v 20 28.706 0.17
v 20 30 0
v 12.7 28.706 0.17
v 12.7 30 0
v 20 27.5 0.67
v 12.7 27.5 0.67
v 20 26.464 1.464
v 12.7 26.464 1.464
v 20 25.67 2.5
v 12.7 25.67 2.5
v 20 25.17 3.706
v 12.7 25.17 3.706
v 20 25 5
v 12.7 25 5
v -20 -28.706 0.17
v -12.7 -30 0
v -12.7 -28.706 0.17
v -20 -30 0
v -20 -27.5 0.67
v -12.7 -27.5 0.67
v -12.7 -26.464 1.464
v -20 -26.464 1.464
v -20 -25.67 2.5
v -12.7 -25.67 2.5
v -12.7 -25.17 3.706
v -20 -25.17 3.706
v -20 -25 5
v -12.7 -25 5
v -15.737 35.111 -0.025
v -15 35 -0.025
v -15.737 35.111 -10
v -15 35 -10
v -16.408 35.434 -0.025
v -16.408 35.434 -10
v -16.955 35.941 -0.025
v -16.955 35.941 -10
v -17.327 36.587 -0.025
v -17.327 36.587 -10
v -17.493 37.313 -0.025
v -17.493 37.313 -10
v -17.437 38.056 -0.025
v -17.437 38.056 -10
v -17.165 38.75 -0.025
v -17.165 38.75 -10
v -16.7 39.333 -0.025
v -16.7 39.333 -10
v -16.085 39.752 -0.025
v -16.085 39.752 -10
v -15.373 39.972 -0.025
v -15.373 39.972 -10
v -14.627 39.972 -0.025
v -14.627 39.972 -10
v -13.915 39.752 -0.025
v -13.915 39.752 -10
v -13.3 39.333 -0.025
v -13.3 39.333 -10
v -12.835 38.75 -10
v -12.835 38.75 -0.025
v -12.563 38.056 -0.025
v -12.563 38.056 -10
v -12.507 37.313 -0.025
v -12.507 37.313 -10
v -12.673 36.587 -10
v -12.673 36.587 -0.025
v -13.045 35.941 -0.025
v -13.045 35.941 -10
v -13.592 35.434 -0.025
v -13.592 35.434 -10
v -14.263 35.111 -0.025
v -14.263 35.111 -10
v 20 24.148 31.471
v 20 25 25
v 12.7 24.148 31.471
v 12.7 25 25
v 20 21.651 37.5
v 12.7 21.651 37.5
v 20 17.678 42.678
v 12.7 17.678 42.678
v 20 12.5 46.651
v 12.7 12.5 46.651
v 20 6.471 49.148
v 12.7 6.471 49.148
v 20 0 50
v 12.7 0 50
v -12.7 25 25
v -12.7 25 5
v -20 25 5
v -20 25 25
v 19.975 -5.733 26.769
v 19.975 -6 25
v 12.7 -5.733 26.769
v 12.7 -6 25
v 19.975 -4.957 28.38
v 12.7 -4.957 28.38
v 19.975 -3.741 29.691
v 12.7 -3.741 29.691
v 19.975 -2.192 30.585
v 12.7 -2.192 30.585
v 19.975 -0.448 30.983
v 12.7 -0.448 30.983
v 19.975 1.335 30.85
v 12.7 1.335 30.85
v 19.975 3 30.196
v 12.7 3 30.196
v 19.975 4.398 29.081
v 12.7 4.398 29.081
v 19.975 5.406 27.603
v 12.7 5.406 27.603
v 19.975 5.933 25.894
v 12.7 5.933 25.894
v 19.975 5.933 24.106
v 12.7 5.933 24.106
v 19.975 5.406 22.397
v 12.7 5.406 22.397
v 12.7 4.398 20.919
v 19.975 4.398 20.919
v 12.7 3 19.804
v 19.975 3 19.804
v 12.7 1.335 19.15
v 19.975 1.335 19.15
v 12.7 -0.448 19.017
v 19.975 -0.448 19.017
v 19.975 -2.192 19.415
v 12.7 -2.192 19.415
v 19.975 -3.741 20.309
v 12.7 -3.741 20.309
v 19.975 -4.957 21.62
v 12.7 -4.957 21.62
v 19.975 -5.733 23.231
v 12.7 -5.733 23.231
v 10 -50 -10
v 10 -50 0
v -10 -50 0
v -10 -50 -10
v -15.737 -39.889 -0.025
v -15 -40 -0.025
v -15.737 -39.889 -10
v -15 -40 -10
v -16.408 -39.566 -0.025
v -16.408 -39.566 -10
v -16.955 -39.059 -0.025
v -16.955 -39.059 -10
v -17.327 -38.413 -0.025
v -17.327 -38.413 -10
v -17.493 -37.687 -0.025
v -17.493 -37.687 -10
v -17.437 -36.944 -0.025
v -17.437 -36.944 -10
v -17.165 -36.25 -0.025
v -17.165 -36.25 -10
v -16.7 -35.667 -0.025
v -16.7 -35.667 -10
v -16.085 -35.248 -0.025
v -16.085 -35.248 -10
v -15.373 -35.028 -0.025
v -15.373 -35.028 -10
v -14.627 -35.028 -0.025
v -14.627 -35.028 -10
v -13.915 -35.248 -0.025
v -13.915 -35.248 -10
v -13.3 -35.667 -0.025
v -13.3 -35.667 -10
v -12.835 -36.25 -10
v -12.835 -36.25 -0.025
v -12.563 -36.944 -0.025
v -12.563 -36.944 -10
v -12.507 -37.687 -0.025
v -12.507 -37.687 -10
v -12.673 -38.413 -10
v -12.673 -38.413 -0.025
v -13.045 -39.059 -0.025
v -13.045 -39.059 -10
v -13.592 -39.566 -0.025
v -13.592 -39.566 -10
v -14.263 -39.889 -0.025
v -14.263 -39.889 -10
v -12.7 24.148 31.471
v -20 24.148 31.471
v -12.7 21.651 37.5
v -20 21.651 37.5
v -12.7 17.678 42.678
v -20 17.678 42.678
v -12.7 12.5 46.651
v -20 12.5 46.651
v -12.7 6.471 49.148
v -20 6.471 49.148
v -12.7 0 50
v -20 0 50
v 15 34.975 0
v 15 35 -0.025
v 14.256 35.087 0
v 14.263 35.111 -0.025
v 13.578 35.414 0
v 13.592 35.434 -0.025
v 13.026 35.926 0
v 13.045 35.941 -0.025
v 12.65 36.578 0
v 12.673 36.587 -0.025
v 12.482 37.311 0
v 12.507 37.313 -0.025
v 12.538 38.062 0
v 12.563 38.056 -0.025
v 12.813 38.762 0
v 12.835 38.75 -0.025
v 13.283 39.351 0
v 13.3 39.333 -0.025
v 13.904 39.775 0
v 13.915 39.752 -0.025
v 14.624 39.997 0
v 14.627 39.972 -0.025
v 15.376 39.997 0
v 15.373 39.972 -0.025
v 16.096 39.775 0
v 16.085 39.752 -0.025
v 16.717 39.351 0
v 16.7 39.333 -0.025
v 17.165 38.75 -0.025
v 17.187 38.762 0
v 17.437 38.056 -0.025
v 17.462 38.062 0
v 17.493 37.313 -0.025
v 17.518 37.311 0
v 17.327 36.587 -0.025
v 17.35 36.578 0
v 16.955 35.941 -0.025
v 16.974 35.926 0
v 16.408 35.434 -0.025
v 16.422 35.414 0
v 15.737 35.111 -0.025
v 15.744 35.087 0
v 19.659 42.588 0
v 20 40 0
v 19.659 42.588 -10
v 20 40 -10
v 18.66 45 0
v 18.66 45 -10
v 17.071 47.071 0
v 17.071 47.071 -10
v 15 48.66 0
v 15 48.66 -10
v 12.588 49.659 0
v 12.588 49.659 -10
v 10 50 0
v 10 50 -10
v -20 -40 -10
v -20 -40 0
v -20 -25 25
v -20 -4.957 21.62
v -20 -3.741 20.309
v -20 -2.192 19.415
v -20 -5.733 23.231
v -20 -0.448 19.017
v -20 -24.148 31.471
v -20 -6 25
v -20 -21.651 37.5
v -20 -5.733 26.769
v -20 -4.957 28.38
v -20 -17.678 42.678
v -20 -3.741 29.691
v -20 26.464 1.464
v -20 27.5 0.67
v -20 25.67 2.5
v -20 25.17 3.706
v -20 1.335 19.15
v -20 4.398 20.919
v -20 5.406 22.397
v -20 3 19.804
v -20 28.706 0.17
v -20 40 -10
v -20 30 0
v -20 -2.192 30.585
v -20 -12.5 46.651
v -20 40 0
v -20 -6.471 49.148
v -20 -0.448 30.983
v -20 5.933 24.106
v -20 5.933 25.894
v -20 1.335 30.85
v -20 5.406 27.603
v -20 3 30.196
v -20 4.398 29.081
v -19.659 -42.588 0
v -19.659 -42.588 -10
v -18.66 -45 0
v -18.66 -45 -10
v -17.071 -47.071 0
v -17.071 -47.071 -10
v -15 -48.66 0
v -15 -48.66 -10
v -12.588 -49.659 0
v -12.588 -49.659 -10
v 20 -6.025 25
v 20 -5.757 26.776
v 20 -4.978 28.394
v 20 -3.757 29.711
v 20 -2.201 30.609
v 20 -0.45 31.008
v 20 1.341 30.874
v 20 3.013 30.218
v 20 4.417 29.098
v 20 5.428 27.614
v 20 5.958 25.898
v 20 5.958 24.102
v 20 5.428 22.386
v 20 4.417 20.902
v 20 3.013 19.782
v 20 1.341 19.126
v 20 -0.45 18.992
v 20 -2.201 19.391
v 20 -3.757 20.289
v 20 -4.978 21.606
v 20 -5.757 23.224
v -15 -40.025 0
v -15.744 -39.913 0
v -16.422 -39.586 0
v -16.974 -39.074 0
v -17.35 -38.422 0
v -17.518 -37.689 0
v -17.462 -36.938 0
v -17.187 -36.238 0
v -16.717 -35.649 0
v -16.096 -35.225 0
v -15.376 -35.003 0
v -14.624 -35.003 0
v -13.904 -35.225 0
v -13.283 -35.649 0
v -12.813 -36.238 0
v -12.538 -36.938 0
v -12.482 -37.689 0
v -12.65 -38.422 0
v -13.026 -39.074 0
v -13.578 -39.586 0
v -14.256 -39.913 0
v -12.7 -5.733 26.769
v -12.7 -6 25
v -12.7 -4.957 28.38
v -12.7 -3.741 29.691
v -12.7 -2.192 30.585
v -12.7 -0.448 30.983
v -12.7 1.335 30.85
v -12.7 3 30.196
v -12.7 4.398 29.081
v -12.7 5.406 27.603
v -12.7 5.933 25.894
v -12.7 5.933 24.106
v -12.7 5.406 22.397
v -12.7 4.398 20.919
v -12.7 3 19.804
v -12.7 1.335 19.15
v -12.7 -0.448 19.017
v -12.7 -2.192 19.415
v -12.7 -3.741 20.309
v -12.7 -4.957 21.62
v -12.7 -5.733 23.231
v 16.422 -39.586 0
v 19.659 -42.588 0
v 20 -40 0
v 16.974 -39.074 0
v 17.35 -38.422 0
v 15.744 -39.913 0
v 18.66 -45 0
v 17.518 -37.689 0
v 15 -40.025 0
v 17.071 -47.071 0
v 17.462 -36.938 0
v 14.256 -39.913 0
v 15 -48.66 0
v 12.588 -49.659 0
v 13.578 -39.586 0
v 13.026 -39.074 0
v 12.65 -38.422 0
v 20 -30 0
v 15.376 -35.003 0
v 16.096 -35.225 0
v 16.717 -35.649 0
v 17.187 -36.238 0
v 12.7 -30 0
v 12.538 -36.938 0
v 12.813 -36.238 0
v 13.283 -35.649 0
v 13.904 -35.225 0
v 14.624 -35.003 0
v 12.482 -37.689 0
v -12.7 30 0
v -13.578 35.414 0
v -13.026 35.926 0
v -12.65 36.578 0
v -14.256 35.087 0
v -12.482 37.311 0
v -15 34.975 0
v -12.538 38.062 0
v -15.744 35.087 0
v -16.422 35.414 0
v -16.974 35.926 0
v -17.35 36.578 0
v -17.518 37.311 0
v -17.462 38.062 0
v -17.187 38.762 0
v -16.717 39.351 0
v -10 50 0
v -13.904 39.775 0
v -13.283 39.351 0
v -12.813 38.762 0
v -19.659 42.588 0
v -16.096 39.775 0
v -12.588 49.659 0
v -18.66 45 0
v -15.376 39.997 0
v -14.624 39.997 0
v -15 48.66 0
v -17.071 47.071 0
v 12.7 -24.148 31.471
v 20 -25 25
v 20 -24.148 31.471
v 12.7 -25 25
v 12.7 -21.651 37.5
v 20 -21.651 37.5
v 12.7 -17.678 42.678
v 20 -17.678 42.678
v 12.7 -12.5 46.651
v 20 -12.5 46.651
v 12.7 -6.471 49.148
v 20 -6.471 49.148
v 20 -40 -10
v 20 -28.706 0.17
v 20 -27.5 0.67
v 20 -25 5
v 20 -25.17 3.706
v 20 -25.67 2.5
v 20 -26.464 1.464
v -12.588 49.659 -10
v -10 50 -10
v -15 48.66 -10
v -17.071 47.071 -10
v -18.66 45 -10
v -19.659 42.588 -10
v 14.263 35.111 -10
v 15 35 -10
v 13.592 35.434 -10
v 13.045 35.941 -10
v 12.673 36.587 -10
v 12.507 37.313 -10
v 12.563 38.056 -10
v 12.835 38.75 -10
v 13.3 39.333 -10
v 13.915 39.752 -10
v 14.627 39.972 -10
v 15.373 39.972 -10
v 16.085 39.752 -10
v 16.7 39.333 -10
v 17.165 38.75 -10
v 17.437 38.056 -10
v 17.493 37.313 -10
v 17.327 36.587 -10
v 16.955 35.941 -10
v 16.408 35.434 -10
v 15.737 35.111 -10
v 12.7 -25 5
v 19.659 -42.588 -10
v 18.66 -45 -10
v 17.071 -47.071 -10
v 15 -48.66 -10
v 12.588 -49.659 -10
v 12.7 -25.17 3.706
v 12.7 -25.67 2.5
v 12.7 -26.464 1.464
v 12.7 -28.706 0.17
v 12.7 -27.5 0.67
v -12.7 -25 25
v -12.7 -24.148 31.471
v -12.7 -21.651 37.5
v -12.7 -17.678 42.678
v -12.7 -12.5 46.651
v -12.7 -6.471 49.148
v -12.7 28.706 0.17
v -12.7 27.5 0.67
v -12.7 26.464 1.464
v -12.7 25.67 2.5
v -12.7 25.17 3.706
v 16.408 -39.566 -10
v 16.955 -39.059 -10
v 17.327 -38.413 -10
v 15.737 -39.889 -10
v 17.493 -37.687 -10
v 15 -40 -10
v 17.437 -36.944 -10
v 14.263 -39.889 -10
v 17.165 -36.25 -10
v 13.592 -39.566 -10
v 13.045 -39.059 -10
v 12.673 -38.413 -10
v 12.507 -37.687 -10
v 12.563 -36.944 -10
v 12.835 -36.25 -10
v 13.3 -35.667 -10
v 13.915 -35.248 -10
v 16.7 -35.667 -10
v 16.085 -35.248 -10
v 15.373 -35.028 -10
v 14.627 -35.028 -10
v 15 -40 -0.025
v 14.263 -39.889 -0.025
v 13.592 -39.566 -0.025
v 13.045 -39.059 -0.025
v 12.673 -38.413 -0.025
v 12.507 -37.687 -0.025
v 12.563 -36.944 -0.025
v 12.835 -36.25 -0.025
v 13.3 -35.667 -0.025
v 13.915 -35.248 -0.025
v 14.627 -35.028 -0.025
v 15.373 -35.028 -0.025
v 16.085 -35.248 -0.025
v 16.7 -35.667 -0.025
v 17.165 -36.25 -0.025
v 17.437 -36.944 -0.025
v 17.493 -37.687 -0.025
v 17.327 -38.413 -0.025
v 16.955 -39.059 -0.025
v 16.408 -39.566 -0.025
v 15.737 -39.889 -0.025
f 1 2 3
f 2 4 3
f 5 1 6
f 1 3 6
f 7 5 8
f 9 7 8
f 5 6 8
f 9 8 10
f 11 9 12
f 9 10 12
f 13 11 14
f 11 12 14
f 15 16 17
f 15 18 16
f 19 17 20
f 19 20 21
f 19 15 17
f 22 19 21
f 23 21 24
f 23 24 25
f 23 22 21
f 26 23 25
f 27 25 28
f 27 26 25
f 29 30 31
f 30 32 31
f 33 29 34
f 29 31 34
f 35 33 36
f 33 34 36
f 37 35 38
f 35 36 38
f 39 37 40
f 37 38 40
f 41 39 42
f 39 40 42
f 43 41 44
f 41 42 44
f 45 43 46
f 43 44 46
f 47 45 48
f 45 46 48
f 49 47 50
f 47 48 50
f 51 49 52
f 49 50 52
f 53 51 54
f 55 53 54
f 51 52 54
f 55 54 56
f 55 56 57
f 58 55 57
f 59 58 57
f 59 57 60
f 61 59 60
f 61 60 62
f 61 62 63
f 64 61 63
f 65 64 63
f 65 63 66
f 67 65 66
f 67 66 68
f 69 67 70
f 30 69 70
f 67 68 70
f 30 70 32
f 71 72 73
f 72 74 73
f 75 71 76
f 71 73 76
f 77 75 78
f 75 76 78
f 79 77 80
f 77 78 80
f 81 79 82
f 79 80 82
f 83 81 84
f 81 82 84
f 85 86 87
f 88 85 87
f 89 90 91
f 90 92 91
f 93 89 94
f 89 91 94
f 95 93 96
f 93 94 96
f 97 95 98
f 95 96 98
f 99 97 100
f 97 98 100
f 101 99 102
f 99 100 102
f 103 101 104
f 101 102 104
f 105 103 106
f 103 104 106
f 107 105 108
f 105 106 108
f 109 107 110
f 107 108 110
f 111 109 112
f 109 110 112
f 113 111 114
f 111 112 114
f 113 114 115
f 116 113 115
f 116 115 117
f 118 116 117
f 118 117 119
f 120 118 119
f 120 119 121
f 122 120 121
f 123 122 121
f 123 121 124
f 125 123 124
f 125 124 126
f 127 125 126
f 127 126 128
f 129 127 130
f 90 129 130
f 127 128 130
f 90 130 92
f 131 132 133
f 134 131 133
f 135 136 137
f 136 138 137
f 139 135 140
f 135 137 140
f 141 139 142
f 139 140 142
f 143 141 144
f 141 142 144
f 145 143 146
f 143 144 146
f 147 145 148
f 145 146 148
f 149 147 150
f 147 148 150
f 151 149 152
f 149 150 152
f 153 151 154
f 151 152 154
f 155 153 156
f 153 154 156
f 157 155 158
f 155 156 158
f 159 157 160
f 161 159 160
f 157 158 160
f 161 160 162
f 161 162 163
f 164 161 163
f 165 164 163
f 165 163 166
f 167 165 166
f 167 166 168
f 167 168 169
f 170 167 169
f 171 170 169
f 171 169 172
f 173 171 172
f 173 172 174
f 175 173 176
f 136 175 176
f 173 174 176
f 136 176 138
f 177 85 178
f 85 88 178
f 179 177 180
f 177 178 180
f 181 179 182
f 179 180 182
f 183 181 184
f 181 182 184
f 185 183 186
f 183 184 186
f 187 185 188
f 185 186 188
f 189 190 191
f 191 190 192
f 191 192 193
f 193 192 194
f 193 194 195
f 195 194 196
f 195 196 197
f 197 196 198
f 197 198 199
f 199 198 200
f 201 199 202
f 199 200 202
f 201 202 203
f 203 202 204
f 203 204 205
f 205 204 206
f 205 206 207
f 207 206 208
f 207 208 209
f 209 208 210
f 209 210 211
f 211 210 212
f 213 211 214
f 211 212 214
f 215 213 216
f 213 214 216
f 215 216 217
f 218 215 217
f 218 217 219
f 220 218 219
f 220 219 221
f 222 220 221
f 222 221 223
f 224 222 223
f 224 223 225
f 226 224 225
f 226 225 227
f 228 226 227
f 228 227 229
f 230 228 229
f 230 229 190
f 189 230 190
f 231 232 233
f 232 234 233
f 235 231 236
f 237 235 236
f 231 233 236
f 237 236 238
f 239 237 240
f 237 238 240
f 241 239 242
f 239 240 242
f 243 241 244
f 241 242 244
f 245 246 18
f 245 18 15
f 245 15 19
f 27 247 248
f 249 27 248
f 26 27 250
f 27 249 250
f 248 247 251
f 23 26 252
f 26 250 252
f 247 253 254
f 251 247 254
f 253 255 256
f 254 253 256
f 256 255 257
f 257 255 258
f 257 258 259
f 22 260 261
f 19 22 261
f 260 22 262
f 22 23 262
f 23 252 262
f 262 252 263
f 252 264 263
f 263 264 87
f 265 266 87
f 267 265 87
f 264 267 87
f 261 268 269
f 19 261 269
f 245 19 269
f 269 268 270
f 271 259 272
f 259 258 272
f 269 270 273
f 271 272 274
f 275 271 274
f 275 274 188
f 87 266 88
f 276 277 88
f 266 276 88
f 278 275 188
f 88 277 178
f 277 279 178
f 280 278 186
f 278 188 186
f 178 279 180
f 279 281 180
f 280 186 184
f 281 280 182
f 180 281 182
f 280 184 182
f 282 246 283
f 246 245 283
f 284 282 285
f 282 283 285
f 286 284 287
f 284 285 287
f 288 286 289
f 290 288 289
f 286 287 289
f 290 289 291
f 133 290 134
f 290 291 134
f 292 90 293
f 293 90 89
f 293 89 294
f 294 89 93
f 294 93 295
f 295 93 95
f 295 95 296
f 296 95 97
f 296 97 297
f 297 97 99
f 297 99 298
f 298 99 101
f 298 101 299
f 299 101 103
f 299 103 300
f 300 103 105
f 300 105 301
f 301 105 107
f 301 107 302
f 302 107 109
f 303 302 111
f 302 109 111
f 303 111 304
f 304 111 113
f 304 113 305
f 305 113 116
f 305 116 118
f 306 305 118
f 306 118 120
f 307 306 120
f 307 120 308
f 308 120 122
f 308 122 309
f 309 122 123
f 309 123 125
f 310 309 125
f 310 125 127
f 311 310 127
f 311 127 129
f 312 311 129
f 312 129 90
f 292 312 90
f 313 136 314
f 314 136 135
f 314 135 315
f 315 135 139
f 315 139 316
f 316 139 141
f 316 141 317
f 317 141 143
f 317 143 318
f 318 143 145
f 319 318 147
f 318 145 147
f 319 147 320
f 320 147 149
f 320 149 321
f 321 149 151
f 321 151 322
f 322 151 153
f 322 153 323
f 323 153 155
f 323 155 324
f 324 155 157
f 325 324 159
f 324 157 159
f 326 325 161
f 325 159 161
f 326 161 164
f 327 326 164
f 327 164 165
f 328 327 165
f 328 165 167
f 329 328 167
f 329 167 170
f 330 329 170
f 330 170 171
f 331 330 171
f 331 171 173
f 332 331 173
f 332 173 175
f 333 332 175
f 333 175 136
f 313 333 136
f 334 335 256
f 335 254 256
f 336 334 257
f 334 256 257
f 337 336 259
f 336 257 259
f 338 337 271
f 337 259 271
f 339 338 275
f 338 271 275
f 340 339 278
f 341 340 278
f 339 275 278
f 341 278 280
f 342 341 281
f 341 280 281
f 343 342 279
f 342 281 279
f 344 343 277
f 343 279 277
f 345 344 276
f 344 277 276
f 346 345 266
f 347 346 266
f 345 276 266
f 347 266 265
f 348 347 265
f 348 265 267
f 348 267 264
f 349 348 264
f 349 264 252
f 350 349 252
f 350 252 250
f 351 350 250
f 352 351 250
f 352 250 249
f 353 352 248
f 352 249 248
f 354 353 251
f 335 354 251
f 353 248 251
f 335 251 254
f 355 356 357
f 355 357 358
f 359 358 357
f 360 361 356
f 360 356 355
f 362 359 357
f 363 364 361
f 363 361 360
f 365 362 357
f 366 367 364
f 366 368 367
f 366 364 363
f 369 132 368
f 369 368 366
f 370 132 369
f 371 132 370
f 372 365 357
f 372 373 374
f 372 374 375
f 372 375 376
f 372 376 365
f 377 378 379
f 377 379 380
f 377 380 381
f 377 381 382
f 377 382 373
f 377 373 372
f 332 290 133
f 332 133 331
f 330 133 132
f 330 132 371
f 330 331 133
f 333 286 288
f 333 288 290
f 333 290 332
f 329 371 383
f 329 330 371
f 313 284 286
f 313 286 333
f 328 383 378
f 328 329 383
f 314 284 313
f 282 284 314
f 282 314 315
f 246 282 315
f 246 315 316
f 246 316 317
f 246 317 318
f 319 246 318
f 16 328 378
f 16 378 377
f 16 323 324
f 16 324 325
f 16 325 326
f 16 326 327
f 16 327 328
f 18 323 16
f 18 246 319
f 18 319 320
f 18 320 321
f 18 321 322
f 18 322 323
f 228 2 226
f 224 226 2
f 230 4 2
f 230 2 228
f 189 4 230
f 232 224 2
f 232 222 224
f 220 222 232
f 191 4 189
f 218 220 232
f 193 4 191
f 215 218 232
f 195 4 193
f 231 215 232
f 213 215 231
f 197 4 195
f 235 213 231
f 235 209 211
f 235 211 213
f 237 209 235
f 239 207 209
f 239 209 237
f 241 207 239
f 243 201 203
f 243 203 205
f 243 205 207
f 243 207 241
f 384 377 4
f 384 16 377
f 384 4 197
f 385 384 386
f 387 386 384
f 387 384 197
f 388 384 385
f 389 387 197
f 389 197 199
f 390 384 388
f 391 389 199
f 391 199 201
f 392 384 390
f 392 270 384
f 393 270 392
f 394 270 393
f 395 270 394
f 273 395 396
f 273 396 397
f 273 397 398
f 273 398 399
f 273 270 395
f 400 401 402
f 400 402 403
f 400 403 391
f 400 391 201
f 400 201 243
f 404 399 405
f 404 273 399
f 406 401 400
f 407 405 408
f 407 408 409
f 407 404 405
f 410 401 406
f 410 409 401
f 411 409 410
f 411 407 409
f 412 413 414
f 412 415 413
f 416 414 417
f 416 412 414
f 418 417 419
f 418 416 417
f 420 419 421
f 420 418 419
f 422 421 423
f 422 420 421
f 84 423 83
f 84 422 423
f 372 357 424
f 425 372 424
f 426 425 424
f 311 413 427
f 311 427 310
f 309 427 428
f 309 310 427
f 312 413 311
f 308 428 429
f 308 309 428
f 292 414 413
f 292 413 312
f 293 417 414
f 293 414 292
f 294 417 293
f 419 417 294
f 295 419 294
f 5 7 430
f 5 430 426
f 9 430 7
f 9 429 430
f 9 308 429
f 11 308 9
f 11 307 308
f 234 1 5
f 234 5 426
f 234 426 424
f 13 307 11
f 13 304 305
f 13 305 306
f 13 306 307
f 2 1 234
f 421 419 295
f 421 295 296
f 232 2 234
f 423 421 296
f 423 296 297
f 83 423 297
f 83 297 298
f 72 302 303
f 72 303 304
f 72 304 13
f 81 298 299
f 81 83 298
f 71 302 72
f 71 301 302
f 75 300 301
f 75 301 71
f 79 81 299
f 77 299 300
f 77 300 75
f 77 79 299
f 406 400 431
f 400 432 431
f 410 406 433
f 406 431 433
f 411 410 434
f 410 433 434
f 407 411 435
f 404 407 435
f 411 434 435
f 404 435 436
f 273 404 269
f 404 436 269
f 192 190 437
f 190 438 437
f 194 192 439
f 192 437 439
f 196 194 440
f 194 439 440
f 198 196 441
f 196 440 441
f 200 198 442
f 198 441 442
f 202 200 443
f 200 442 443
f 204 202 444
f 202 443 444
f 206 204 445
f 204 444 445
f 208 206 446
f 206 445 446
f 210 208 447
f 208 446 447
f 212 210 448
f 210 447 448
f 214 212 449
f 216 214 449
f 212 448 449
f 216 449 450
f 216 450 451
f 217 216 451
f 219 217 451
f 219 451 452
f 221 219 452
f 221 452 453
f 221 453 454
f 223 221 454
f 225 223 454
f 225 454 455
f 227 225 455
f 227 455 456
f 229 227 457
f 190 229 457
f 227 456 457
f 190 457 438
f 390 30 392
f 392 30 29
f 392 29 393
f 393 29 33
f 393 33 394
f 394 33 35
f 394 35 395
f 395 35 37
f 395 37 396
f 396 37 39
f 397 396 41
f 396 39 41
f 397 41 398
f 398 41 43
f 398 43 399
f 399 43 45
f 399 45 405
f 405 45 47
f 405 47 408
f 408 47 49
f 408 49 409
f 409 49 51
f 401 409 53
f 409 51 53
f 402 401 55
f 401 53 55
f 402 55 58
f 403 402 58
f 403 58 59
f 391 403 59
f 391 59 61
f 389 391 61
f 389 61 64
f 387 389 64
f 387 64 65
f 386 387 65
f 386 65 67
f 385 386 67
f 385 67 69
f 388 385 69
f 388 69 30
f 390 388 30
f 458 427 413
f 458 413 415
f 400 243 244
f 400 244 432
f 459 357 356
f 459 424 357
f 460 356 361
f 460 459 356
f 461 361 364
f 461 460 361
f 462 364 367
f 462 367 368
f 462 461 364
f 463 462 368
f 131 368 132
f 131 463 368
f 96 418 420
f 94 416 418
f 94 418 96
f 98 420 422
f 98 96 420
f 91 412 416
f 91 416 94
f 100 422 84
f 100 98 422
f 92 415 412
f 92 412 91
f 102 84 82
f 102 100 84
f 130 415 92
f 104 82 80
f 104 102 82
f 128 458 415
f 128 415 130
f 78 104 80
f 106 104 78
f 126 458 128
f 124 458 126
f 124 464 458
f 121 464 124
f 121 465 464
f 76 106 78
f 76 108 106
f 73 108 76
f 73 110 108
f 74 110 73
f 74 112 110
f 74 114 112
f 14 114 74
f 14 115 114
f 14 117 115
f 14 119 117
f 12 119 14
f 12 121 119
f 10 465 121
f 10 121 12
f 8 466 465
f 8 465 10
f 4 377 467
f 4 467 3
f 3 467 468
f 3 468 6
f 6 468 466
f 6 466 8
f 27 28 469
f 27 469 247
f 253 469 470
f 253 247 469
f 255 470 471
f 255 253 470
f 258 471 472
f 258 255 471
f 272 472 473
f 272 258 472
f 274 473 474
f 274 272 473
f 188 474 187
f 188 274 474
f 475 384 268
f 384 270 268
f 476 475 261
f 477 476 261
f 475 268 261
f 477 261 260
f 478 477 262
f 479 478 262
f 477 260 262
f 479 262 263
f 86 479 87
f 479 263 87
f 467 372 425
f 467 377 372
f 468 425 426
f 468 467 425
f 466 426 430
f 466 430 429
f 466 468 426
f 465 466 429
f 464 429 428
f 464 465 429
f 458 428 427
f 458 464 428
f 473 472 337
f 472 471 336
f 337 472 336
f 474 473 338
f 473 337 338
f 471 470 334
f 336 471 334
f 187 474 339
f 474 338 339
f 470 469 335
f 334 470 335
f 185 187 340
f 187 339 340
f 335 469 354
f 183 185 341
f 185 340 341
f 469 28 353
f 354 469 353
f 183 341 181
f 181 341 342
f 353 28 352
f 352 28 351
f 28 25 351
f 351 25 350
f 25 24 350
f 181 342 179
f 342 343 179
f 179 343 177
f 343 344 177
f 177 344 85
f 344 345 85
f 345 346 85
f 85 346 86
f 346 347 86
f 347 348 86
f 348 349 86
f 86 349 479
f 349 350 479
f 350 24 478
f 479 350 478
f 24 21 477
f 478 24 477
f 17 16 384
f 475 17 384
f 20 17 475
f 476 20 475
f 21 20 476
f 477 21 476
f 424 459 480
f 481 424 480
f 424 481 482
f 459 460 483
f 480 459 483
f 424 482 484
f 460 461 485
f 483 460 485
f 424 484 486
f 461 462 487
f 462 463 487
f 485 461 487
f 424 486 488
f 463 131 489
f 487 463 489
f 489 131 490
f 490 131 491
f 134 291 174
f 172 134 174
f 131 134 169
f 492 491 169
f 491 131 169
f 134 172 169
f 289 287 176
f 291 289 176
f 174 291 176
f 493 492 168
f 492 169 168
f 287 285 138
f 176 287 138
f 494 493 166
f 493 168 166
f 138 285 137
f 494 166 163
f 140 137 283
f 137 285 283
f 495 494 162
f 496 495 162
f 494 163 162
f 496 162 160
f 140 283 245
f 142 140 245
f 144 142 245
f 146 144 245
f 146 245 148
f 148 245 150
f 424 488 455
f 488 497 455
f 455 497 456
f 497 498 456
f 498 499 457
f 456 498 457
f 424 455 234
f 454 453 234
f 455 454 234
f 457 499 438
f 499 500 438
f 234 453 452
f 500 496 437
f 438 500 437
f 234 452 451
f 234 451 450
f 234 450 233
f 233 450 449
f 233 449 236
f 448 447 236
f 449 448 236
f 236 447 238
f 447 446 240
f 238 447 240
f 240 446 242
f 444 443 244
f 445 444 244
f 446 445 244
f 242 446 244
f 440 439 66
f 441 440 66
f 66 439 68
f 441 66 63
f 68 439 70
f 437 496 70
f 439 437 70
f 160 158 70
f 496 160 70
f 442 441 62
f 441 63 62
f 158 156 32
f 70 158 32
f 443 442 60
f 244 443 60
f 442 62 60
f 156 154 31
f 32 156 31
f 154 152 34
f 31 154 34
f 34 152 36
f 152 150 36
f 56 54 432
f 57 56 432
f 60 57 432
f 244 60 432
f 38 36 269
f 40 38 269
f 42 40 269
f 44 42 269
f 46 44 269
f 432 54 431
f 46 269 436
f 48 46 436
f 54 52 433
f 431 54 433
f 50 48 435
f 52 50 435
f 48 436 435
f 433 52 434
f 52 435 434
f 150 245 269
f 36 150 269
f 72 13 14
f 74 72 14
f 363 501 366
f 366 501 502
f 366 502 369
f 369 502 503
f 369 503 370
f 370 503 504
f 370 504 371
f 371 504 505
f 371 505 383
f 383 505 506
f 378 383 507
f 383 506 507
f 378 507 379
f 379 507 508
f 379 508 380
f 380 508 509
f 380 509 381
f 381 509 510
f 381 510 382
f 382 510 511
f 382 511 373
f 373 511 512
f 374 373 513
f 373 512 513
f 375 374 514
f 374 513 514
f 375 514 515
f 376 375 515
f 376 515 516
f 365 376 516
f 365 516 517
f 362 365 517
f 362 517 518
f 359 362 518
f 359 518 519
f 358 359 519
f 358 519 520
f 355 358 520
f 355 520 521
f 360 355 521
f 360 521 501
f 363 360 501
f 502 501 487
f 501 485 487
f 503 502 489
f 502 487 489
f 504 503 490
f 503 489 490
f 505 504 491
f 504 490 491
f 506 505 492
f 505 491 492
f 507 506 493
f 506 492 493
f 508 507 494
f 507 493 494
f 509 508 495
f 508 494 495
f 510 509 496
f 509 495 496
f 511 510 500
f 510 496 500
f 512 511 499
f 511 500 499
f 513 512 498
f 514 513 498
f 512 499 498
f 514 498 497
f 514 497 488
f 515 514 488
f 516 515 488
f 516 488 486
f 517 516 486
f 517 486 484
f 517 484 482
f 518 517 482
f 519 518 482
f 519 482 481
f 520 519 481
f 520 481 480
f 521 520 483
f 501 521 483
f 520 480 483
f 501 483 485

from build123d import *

# Parameters (mm, degrees)
SKETCH1_W                        = 100
SKETCH1_H                        = 40
BOSS_EXTRUDE1_DEPTH              = 10
SKETCH2_W                        = 50
SKETCH2_H                        = 7.3
BOSS_EXTRUDE2_DEPTH              = 50
FILLET1_R                        = 25
F_12_0MM_DOWEL_HOLE1_D           = 12
F_12_0MM_DOWEL_HOLE1_CSINK_D     = 12.05
F_12_0MM_DOWEL_HOLE1_CSINK_ANGLE = 90
F_5_0MM_DOWEL_HOLE1_D            = 5
F_5_0MM_DOWEL_HOLE1_CSINK_D      = 5.05
F_5_0MM_DOWEL_HOLE1_CSINK_ANGLE  = 90
FILLET2_R                        = 10
FILLET3_R                        = 5


with BuildPart() as part:
    # Sketch1 → Boss-Extrude1 (new body)
    with BuildSketch(Plane(origin=(0, 0, 0), x_dir=(0, 1, 0), z_dir=(0, 0, 1))):
        Rectangle(SKETCH1_W, SKETCH1_H)
    extrude(amount=-BOSS_EXTRUDE1_DEPTH)

    # Sketch2 → Boss-Extrude2 (add)
    with BuildSketch(Plane(origin=(0, 0, 0), x_dir=(0, 1, 0), z_dir=(0, 0, 1))):
        with Locations((0, 16.35)):
            Rectangle(SKETCH2_W, SKETCH2_H)
        with Locations((0, -16.35)):
            Rectangle(SKETCH2_W, SKETCH2_H)
    extrude(amount=BOSS_EXTRUDE2_DEPTH)

    # Fillet1
    fillet1_edges = [part.edges().sort_by_distance(p)[0] for p in [
        (16.35, 25, 50),
        (16.35, -25, 50),
        (-16.35, 25, 50),
        (-16.35, -25, 50),
    ]]
    fillet(fillet1_edges, radius=FILLET1_R - 0.0001)  # a hair under: the kernel refuses the full size

    # Ø12.0mm Dowel Hole1 (through all)
    with Locations(Plane.YZ.offset(20)):
        with Locations((0, 25)):
            CounterSinkHole(F_12_0MM_DOWEL_HOLE1_D / 2, F_12_0MM_DOWEL_HOLE1_CSINK_D / 2, counter_sink_angle=F_12_0MM_DOWEL_HOLE1_CSINK_ANGLE)

    # Ø5.0mm Dowel Hole1 (through all)
    with Locations(Plane(origin=(0, 0, 0), x_dir=(0, 1, 0), z_dir=(0, 0, 1))):
        with Locations((37.5, -15), (-37.5, 15), (-37.5, -15), (37.5, 15)):
            CounterSinkHole(F_5_0MM_DOWEL_HOLE1_D / 2, F_5_0MM_DOWEL_HOLE1_CSINK_D / 2, counter_sink_angle=F_5_0MM_DOWEL_HOLE1_CSINK_ANGLE)

    # Fillet2
    fillet2_edges = [part.edges().sort_by_distance(p)[0] for p in [
        (-20, -50, -5),
        (-20, 50, -5),
        (20, 50, -5),
        (20, -50, -5),
    ]]
    fillet(fillet2_edges, radius=FILLET2_R)

    # Fillet3
    fillet3_edges = [part.edges().sort_by_distance(p)[0] for p in [
        (-16.35, -25, 0),
        (-16.35, 25, 0),
        (16.35, -25, 0),
        (16.35, 25, 0),
    ]]
    fillet(fillet3_edges, radius=FILLET3_R)


solid = part.part
